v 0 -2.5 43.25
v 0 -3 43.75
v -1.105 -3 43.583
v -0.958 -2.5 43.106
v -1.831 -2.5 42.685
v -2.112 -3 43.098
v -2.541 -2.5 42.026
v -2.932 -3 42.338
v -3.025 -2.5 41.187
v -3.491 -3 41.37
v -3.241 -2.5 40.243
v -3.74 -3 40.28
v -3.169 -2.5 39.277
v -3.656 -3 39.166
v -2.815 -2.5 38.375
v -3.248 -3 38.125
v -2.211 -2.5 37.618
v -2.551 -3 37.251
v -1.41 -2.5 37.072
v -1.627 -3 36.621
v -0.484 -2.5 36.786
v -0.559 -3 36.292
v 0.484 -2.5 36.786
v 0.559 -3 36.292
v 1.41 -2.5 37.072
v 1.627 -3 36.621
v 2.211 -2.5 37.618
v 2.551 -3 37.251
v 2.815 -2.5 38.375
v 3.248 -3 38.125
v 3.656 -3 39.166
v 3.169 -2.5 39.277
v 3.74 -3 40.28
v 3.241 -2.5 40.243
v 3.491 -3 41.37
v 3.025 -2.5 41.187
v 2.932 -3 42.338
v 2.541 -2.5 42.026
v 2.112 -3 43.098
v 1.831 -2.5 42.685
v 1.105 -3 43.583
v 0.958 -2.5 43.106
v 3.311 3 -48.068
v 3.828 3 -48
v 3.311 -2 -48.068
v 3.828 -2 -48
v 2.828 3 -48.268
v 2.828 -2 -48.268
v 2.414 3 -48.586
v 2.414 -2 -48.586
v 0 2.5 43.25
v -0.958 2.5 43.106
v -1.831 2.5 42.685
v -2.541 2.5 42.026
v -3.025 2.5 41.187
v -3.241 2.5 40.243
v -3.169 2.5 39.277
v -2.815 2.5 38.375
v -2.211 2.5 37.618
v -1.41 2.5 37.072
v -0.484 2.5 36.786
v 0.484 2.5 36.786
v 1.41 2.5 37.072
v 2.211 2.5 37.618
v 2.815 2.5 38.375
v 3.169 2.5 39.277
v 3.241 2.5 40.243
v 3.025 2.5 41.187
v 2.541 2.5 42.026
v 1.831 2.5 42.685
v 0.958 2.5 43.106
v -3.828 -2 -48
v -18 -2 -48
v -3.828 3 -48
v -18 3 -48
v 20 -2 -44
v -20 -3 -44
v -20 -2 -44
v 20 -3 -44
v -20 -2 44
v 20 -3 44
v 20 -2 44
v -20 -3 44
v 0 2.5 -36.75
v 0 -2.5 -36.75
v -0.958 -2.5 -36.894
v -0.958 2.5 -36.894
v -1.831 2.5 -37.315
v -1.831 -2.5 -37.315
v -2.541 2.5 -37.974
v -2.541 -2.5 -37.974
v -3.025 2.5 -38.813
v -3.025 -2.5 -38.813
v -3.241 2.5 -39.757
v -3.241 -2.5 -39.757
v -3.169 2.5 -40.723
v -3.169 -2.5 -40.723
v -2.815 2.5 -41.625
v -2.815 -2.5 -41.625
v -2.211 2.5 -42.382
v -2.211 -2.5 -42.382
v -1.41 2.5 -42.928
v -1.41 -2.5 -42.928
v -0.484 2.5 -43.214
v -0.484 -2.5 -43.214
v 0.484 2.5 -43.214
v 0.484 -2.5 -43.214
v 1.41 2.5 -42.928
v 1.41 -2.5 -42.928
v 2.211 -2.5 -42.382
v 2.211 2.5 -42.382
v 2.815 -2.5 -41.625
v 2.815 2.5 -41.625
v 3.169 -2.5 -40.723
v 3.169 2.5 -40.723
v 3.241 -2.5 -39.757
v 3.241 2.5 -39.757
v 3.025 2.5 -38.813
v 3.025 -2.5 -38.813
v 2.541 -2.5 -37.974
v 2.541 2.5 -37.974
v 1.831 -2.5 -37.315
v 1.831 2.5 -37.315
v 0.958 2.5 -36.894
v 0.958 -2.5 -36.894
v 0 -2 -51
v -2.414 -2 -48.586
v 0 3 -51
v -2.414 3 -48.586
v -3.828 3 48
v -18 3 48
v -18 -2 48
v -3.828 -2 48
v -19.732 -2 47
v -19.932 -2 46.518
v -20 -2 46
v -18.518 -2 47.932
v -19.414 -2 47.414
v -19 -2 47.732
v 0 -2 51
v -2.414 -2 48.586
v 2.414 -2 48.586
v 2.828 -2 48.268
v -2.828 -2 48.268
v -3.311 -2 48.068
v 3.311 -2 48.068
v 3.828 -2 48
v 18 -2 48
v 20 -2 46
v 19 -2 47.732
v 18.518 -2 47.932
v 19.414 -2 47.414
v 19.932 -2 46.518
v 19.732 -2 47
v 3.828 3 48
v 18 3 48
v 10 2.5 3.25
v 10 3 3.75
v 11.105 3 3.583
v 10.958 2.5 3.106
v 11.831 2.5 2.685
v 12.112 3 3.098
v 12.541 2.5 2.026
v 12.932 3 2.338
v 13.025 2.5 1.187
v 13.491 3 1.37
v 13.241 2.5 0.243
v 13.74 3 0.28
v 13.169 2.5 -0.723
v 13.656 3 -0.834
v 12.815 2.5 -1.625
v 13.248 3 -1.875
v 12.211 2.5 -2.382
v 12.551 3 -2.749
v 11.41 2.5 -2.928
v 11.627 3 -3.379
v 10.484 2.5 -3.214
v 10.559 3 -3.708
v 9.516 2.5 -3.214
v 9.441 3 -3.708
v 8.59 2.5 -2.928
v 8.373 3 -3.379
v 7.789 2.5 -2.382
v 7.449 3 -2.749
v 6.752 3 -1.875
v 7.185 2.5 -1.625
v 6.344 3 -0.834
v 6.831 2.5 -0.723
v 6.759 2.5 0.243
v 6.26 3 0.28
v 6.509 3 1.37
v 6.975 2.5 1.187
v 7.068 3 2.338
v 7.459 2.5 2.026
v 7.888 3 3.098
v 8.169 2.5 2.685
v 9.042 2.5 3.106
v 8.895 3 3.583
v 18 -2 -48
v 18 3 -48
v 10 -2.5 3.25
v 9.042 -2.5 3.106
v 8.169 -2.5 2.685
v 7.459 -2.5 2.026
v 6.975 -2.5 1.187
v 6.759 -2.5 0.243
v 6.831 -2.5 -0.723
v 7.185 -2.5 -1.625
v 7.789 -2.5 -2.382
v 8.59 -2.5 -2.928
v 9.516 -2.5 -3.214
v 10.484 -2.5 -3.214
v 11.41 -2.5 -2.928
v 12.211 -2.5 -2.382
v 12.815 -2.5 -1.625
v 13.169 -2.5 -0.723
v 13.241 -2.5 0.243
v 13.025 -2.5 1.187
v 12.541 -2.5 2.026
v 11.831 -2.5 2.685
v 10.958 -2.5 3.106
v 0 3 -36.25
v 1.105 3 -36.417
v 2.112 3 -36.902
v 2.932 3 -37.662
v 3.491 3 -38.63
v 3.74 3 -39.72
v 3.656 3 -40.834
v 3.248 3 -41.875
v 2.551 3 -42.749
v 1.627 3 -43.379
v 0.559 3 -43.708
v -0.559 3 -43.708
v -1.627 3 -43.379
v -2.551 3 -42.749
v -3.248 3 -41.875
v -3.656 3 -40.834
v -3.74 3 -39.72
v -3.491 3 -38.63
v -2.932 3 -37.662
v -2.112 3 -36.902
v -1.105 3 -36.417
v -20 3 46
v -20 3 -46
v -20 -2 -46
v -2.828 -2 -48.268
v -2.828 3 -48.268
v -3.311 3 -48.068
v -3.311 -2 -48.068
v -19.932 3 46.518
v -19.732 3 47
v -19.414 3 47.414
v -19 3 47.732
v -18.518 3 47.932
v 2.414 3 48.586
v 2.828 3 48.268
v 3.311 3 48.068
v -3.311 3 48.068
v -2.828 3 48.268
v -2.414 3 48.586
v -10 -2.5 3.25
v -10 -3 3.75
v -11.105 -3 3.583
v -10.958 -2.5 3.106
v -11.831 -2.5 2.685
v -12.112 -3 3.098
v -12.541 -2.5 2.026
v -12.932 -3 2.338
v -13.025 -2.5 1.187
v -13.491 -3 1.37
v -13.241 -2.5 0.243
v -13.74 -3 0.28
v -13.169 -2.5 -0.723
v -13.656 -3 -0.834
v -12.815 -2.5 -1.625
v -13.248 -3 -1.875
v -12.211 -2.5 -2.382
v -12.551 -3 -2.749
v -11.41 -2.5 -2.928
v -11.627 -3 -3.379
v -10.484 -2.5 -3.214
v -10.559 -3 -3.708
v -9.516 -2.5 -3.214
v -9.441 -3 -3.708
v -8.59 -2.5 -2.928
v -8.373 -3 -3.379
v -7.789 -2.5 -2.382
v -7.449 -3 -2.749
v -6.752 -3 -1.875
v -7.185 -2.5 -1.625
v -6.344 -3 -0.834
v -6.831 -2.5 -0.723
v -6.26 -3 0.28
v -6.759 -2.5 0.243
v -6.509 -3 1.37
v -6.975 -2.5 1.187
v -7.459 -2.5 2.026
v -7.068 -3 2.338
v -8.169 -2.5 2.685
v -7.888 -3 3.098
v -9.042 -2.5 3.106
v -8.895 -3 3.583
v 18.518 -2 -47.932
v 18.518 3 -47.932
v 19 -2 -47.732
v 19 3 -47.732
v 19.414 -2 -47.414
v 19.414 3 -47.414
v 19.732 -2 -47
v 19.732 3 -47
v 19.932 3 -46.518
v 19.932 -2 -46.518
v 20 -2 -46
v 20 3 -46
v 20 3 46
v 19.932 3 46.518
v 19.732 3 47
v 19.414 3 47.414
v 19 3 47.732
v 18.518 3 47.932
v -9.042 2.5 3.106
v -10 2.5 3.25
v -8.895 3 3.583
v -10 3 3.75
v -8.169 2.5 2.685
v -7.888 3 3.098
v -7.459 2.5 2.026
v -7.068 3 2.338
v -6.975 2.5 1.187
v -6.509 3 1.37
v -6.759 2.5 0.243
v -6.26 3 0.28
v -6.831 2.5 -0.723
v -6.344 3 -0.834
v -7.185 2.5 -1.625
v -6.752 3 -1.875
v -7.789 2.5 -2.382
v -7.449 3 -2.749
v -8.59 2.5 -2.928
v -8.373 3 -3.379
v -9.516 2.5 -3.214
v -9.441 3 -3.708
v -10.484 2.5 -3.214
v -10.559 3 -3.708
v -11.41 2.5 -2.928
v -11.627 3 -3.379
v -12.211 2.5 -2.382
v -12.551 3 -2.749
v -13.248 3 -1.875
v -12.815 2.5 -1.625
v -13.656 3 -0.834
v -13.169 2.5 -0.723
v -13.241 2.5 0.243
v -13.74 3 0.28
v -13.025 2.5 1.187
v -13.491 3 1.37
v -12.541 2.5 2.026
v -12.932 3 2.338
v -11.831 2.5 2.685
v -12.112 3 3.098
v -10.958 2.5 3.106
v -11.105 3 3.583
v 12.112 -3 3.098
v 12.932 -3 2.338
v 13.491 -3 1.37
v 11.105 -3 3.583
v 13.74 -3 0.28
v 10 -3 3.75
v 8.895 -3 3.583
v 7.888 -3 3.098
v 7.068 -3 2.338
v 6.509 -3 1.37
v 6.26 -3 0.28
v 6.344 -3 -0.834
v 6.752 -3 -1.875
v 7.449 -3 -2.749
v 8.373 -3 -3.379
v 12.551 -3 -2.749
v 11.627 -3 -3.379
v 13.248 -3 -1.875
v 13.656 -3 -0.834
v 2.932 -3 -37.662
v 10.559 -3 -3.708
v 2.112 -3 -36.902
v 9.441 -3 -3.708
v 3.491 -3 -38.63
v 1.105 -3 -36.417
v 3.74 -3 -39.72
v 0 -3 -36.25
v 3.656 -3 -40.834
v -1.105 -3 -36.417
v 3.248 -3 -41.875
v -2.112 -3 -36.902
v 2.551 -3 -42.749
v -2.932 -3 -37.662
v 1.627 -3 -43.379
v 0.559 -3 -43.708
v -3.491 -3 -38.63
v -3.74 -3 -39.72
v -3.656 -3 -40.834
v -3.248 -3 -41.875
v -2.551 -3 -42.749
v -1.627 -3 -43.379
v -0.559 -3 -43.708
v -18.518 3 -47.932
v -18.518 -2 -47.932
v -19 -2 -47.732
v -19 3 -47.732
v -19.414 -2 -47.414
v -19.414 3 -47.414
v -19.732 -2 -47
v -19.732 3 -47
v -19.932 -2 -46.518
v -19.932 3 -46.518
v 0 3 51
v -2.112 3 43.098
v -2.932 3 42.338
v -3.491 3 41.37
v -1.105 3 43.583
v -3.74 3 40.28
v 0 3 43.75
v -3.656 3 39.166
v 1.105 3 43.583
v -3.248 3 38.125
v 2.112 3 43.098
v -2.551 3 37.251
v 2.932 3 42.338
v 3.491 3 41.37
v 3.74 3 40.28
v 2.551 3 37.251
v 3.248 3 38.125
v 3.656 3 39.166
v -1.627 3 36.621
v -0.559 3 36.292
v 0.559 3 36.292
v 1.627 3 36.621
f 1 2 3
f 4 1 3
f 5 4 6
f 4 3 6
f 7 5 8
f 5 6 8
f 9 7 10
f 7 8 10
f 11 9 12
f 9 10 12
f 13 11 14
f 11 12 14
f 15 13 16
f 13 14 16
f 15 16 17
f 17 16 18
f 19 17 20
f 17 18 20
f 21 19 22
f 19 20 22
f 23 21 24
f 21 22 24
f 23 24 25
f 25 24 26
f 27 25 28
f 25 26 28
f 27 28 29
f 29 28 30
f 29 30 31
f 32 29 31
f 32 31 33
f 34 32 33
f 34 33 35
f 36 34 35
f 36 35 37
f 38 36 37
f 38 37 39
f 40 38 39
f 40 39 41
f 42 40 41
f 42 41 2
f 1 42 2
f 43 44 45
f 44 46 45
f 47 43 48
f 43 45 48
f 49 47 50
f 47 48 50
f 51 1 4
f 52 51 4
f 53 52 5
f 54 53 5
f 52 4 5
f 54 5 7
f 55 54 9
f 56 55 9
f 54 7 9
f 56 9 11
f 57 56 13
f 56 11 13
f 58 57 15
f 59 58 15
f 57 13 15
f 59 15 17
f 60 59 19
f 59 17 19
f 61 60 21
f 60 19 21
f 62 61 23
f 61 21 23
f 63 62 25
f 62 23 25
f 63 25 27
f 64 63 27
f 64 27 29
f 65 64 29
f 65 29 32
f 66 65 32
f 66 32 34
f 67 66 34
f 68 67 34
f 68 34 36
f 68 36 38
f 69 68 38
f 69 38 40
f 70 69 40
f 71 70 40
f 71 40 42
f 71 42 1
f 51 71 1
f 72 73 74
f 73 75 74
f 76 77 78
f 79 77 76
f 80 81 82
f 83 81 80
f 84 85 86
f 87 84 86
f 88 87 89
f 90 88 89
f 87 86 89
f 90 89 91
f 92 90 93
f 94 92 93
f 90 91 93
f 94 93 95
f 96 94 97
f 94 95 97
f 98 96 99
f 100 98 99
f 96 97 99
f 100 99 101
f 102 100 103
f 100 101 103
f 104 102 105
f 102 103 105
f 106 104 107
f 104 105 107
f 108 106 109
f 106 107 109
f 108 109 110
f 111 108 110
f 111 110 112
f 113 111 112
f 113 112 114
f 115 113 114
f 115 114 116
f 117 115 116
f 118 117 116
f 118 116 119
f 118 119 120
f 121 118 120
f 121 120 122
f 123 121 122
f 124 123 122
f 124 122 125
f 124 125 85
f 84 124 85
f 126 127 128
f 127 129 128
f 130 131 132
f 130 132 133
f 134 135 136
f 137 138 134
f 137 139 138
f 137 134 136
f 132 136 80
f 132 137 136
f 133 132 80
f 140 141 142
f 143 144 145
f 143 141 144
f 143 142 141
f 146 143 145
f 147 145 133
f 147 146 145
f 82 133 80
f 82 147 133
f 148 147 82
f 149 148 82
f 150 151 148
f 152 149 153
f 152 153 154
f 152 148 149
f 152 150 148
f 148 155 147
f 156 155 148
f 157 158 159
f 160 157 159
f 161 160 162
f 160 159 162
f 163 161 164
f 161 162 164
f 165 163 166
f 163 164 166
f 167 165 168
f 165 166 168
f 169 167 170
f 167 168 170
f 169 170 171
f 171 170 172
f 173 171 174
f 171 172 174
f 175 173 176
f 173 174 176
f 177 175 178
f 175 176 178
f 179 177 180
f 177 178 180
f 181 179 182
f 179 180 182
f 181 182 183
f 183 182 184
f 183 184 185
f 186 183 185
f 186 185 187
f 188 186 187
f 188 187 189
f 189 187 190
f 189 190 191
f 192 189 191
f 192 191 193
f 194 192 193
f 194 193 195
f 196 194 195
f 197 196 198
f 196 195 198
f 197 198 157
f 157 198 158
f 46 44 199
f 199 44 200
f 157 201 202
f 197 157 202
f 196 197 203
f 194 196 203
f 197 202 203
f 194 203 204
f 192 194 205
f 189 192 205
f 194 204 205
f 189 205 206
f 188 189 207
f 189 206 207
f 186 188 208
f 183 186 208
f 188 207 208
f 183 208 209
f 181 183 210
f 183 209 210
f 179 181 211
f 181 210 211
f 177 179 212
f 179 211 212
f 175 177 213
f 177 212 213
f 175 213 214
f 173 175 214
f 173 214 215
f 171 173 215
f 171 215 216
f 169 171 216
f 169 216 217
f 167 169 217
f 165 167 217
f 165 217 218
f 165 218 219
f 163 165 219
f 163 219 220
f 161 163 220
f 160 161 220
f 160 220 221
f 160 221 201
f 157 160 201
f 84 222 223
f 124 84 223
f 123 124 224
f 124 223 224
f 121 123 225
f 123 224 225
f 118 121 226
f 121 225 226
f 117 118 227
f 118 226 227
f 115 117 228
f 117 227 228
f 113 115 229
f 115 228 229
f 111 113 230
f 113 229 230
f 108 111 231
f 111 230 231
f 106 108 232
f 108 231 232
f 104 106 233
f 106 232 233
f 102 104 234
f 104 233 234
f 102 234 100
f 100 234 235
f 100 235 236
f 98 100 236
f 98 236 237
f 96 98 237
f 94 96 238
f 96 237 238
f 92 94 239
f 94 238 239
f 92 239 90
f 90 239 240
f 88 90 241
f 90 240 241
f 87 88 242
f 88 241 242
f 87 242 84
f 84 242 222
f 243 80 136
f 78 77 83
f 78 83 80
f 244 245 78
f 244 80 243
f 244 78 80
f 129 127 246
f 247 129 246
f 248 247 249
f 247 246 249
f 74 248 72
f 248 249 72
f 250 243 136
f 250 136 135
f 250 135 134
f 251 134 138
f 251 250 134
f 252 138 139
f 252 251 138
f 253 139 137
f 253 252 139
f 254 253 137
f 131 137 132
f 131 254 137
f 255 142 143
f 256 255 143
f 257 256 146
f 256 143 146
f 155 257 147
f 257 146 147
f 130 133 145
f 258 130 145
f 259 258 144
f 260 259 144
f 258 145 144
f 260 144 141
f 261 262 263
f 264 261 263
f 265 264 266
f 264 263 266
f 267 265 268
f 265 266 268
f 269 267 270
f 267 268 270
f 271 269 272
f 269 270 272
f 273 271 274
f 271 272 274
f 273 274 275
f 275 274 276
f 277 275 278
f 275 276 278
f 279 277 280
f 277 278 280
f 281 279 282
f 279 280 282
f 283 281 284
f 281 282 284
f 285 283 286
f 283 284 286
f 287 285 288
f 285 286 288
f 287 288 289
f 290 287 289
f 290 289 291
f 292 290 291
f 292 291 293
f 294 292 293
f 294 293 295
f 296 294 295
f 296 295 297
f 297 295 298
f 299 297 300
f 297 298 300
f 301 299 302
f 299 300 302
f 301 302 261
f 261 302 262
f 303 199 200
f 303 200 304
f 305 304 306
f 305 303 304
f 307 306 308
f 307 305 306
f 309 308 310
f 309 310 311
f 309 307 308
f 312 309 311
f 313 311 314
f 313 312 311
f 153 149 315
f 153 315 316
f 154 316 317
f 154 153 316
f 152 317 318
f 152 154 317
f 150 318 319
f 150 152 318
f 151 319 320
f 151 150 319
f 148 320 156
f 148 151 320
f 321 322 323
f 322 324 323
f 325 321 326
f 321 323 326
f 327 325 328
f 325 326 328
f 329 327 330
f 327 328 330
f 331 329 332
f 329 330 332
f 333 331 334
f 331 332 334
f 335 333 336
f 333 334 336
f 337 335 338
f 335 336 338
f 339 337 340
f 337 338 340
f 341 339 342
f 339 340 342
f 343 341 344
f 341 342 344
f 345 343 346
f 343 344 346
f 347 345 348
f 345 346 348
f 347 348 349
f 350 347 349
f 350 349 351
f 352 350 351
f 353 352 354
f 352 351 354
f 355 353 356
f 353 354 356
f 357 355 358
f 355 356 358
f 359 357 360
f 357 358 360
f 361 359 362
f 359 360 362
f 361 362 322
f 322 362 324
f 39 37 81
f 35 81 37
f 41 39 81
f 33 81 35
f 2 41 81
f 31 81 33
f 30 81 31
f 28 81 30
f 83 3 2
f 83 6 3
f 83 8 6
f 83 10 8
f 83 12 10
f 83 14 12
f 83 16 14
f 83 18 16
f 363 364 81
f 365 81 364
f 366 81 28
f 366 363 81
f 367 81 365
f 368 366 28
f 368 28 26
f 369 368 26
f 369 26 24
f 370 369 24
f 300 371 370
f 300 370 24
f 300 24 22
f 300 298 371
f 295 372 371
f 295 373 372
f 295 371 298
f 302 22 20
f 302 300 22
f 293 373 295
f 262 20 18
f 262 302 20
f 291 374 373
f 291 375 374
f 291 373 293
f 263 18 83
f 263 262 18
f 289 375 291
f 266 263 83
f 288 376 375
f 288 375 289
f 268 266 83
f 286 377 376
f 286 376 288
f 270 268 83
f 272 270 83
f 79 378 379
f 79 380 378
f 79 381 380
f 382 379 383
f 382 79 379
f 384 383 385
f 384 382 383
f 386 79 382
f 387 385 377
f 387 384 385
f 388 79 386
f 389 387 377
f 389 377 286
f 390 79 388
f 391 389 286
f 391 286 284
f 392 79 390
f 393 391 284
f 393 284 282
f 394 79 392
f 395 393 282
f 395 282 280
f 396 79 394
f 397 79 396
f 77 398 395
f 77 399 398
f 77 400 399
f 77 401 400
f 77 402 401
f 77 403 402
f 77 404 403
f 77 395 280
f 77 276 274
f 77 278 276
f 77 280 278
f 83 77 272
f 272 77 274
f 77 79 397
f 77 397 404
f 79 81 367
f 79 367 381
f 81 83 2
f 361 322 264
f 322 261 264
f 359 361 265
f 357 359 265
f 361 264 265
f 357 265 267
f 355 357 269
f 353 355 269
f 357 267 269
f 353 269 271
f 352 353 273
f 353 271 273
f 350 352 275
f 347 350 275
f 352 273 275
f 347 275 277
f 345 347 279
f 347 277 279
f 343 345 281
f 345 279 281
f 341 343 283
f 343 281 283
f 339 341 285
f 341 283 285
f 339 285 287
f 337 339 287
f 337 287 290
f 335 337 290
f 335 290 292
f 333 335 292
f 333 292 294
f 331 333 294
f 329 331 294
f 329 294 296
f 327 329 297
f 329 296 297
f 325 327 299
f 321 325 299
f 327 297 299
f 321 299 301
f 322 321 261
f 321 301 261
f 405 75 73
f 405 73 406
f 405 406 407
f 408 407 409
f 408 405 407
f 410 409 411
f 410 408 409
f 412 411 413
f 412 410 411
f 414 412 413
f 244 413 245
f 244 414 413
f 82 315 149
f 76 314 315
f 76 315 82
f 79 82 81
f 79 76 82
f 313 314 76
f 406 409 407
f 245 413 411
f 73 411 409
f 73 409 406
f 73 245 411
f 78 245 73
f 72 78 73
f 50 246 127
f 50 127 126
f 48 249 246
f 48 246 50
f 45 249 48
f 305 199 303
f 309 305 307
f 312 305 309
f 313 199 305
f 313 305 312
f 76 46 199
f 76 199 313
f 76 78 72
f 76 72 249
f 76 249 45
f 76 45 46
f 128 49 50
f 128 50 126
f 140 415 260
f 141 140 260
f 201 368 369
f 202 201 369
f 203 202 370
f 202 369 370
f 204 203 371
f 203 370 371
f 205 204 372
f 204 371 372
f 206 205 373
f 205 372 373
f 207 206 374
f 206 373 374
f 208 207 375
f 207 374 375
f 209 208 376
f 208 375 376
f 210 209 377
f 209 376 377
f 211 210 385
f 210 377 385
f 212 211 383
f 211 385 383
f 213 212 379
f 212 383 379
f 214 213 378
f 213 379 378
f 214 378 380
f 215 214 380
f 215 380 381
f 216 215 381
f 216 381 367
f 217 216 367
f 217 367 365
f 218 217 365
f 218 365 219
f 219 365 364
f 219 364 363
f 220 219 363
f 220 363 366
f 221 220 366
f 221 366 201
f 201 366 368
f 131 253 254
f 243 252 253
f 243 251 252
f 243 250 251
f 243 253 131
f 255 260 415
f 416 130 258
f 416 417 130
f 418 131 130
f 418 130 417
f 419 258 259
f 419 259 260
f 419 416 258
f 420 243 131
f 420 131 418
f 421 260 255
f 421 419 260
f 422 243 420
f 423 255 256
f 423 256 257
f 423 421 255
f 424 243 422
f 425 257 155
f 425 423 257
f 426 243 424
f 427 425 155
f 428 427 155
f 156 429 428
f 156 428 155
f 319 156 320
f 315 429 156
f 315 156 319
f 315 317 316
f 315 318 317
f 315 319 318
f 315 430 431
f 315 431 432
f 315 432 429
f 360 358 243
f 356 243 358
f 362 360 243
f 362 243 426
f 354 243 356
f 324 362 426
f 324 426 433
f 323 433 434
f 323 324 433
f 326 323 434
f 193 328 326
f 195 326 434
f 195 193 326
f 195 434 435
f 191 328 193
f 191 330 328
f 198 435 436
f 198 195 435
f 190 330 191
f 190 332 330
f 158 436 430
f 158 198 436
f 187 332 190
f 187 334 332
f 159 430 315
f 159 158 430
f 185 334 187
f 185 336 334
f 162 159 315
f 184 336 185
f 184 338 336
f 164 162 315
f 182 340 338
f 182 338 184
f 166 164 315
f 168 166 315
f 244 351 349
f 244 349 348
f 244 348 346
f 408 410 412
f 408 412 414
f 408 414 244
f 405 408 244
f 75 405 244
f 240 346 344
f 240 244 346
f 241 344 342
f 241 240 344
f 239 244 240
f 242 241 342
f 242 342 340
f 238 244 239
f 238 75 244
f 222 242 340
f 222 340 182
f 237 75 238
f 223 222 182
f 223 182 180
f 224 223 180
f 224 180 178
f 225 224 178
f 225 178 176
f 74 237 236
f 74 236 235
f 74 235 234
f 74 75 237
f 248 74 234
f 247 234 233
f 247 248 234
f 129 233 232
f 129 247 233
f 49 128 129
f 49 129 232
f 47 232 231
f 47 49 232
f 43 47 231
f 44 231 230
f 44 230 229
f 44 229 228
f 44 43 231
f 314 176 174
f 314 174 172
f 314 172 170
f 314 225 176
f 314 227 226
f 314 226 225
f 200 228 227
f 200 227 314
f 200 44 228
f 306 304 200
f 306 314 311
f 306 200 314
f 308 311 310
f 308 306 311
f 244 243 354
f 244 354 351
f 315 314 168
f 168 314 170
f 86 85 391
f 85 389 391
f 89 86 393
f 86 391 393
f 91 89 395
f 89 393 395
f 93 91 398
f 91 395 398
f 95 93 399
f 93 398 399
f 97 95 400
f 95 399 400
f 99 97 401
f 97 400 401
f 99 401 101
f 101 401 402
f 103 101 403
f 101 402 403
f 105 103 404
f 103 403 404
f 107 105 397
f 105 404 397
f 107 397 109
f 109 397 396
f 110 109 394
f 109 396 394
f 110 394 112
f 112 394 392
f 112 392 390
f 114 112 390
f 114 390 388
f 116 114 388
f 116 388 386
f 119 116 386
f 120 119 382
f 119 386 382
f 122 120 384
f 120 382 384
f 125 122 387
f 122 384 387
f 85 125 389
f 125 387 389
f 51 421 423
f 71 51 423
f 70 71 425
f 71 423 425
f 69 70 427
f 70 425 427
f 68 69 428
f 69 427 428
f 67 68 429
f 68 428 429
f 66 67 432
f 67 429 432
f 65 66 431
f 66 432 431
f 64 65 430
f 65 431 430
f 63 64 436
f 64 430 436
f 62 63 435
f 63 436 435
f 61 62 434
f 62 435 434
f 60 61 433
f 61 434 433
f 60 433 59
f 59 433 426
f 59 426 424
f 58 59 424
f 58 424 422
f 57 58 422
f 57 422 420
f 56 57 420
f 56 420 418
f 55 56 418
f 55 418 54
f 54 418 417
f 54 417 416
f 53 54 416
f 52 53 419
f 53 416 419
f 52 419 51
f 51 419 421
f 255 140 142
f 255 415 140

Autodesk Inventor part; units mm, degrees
ref_plane "XZ Plane" through (0, 0, 0) normal (0, 1, 0) x (-1, 0, 0)
sketch "Skizze1" plane through (0, 0, 0) normal (0, 0, 1) x (1, 0, 0)
  line L0 (-20, 3) -> (20, 3)
  line L1 (20, 3) -> (20, -3)
  line L2 (20, -3) -> (-20, -3)
  line L3 (-20, -3) -> (-20, 3)
  line L4 (-20, 3) -> (20, -3) construction
  line L5 (20, 3) -> (-20, -3) construction
  point P0 (0, 0)
  dimension "d0" = 6
  dimension "d2" = 40
extrude "Extrusion1" add sketch "Skizze1" along normal mid plane 96
sketch "Skizze3" plane through (-20, 3, 48) normal (0, 1, 0) x (1, 0, 0)
  line L0 (0, 96) -> (0, 0) projected
  line L1 (40, 0) -> (0, 0) projected
  line L2 (40, 96) -> (40, 0) projected
  line L3 (0, 96) -> (40, 96) projected
  point P0 (20, 48)
  point P1 (10, 48)
  point P2 (30, 48)
  point P3 (0, 48)
  dimension "d5" = 10
  dimension "d6" = 10
hole "Bohrung1" at (-10, 3, 0) at (10, 3, 0) direction (0, -1, 0) diameter 6.5 end through all
sketch "Skizze4" plane through (-20, 3, 48) normal (0, 1, 0) x (1, 0, 0)
  circle A0 centre (30, 48) radius 3.25 projected
  circle A1 centre (10, 48) radius 3.25 projected
  line L0 (0, 96) -> (0, 0) projected
  line L1 (40, 0) -> (0, 0) projected
  line L2 (40, 96) -> (40, 0) projected
  line L3 (0, 96) -> (40, 96) projected
  point P0 (20, 48)
  point P1 (20, 8)
  point P2 (20, 88)
  dimension "d14" = 40
  dimension "d15" = 40
hole "Bohrung2" at (0, 3, 40) at (0, 3, -40) direction (0, -1, 0) diameter 6.5 end through all
sketch "Skizze5" plane through (-20, 3, 48) normal (0, 1, 0) x (1, 0, 0)
  circle A0 centre (20, 88) radius 3.25 projected
  circle A1 centre (20, 8) radius 3.25 projected
  circle A2 centre (30, 48) radius 3.25 projected
  circle A3 centre (10, 48) radius 3.25 projected
  line L0 (0, 96) -> (0, 0) projected
  line L1 (40, 0) -> (0, 0) projected
  line L2 (40, 96) -> (40, 0) projected
  line L3 (0, 96) -> (40, 96) projected
  line L4 (20, 115.8) -> (20, -22.8) projected
  line L5 (40, 0) -> (0, 0) projected
  line L6 (20, -3) -> (23, 0)
  line L7 (20, -3) -> (17, 0)
  line L8 (0, 0) -> (40, 0) projected
  point P0 (20, 48)
  dimension "d29" = 6
  dimension "d30" = 3
  dimension "d31" = 45
extrude "Extrusion2" add sketch "Skizze5" against normal up to surface (6 mm away) contours L4 L7 L1 | L1 L6 L4
mirror "Spiegeln1" about plane through (0, 0, 0) normal (1, 0, 0) of "Extrusion2"
mirror "Spiegeln2" about plane through (0, 0, 0) normal (0, 0, 1) of "Extrusion2", "Spiegeln1"
fillet "Rundung1" radius 2 4 edges at (-20, 0, 48) (20, 0, 48) (-20, 0, -48) (20, 0, -48)
fillet "Rundung2" radius 2 4 edges at (-3, 0, 48) (3, 0, 48) (-3, 0, -48) (3, 0, -48)
sketch "Skizze6" plane through (20, -3, -46) normal (0, -1, 0) x (1, 0, 0)
  circle A0 centre (-20, 6) radius 3.25 projected
  circle A1 centre (-20, 86) radius 3.25 projected
  circle A2 centre (-10, 46) radius 3.25 projected
  circle A3 centre (-30, 46) radius 3.25 projected
  arc A4 (-2, -2) -> (0, 0) centre (-2, 0) ccw projected
  line L0 (0, 0) -> (0, 92) projected
  arc A5 (0, 92) -> (-2, 94) centre (-2, 92) ccw projected
  line L1 (-16.1716, 94) -> (-2, 94) projected
  arc A6 (-17.5858, 94.5858) -> (-16.1716, 94) centre (-16.1716, 96) ccw projected
  line L2 (-20, 97) -> (-17.5858, 94.5858) projected
  line L3 (-22.4142, 94.5858) -> (-20, 97) projected
  arc A7 (-23.8284, 94) -> (-22.4142, 94.5858) centre (-23.8284, 96) ccw projected
  line L4 (-38, 94) -> (-23.8284, 94) projected
  arc A8 (-38, 94) -> (-40, 92) centre (-38, 92) ccw projected
  line L5 (-40, 92) -> (-40, 0) projected
  arc A9 (-40, 0) -> (-38, -2) centre (-38, 0) ccw projected
  line L6 (-23.8284, -2) -> (-38, -2) projected
  arc A10 (-22.4142, -2.5858) -> (-23.8284, -2) centre (-23.8284, -4) ccw projected
  line L7 (-22.4142, -2.5858) -> (-20, -5) projected
  line L8 (-20, -5) -> (-17.5858, -2.5858) projected
  arc A11 (-16.1716, -2) -> (-17.5858, -2.5858) centre (-16.1716, -4) ccw projected
  line L9 (-2, -2) -> (-16.1716, -2) projected
  line L10 (-59.3165, 111.9132) -> (18.0456, 111.9132)
  line L11 (18.0456, 111.9132) -> (18.0456, 90)
  line L12 (18.0456, 90) -> (-59.3165, 90)
  line L13 (-59.3165, 90) -> (-59.3165, 111.9132)
  line L14 (-80.9876, 2) -> (21.6776, 2)
  line L15 (21.6776, 2) -> (21.6776, -24.7559)
  line L16 (21.6776, -24.7559) -> (-80.9876, -24.7559)
  line L17 (-80.9876, -24.7559) -> (-80.9876, 2)
  point P0 (-20, 46)
  point P1 (-40, 2)
  point P2 (0, 2)
  dimension "d34" = 4
  dimension "d35" = 4
  dimension "d36" = 77.3621
  dimension "d37" = 21.9132
  dimension "d38" = 102.6652
  dimension "d39" = 26.7559
extrude "Extrusion3" cut sketch "Skizze6" against normal blind 1 contours L9 A11 L8 L7 A10 L6 A9 L5 L14 L0 A4 | A4 L0 L14 L15 L16 L17 L5 A9 L6 A10 L7 L8 A11 L9 | L12 L5 A8 L4 A7 L3 L2 A6 L1 A5 L0 | L0 A5 L1 A6 L2 L3 A7 L4 A8 L5 L12 L13 L10 L11
chamfer "Fasen1" distance 0.5 angle 45 4 edges at (-10, -3, -3.25) (-10, 3, -3.25) (10, -3, -3.25) (10, 3, -3.25)
chamfer "Fasen2" distance 0.5 angle 45 2 edges at (0, -3, 36.75) (0, 3, 36.75)
chamfer "Fasen3" distance 0.5 angle 45 2 edges at (0, -3, -43.25) (0, 3, -43.25)
properties part number "Klemmplatte"
